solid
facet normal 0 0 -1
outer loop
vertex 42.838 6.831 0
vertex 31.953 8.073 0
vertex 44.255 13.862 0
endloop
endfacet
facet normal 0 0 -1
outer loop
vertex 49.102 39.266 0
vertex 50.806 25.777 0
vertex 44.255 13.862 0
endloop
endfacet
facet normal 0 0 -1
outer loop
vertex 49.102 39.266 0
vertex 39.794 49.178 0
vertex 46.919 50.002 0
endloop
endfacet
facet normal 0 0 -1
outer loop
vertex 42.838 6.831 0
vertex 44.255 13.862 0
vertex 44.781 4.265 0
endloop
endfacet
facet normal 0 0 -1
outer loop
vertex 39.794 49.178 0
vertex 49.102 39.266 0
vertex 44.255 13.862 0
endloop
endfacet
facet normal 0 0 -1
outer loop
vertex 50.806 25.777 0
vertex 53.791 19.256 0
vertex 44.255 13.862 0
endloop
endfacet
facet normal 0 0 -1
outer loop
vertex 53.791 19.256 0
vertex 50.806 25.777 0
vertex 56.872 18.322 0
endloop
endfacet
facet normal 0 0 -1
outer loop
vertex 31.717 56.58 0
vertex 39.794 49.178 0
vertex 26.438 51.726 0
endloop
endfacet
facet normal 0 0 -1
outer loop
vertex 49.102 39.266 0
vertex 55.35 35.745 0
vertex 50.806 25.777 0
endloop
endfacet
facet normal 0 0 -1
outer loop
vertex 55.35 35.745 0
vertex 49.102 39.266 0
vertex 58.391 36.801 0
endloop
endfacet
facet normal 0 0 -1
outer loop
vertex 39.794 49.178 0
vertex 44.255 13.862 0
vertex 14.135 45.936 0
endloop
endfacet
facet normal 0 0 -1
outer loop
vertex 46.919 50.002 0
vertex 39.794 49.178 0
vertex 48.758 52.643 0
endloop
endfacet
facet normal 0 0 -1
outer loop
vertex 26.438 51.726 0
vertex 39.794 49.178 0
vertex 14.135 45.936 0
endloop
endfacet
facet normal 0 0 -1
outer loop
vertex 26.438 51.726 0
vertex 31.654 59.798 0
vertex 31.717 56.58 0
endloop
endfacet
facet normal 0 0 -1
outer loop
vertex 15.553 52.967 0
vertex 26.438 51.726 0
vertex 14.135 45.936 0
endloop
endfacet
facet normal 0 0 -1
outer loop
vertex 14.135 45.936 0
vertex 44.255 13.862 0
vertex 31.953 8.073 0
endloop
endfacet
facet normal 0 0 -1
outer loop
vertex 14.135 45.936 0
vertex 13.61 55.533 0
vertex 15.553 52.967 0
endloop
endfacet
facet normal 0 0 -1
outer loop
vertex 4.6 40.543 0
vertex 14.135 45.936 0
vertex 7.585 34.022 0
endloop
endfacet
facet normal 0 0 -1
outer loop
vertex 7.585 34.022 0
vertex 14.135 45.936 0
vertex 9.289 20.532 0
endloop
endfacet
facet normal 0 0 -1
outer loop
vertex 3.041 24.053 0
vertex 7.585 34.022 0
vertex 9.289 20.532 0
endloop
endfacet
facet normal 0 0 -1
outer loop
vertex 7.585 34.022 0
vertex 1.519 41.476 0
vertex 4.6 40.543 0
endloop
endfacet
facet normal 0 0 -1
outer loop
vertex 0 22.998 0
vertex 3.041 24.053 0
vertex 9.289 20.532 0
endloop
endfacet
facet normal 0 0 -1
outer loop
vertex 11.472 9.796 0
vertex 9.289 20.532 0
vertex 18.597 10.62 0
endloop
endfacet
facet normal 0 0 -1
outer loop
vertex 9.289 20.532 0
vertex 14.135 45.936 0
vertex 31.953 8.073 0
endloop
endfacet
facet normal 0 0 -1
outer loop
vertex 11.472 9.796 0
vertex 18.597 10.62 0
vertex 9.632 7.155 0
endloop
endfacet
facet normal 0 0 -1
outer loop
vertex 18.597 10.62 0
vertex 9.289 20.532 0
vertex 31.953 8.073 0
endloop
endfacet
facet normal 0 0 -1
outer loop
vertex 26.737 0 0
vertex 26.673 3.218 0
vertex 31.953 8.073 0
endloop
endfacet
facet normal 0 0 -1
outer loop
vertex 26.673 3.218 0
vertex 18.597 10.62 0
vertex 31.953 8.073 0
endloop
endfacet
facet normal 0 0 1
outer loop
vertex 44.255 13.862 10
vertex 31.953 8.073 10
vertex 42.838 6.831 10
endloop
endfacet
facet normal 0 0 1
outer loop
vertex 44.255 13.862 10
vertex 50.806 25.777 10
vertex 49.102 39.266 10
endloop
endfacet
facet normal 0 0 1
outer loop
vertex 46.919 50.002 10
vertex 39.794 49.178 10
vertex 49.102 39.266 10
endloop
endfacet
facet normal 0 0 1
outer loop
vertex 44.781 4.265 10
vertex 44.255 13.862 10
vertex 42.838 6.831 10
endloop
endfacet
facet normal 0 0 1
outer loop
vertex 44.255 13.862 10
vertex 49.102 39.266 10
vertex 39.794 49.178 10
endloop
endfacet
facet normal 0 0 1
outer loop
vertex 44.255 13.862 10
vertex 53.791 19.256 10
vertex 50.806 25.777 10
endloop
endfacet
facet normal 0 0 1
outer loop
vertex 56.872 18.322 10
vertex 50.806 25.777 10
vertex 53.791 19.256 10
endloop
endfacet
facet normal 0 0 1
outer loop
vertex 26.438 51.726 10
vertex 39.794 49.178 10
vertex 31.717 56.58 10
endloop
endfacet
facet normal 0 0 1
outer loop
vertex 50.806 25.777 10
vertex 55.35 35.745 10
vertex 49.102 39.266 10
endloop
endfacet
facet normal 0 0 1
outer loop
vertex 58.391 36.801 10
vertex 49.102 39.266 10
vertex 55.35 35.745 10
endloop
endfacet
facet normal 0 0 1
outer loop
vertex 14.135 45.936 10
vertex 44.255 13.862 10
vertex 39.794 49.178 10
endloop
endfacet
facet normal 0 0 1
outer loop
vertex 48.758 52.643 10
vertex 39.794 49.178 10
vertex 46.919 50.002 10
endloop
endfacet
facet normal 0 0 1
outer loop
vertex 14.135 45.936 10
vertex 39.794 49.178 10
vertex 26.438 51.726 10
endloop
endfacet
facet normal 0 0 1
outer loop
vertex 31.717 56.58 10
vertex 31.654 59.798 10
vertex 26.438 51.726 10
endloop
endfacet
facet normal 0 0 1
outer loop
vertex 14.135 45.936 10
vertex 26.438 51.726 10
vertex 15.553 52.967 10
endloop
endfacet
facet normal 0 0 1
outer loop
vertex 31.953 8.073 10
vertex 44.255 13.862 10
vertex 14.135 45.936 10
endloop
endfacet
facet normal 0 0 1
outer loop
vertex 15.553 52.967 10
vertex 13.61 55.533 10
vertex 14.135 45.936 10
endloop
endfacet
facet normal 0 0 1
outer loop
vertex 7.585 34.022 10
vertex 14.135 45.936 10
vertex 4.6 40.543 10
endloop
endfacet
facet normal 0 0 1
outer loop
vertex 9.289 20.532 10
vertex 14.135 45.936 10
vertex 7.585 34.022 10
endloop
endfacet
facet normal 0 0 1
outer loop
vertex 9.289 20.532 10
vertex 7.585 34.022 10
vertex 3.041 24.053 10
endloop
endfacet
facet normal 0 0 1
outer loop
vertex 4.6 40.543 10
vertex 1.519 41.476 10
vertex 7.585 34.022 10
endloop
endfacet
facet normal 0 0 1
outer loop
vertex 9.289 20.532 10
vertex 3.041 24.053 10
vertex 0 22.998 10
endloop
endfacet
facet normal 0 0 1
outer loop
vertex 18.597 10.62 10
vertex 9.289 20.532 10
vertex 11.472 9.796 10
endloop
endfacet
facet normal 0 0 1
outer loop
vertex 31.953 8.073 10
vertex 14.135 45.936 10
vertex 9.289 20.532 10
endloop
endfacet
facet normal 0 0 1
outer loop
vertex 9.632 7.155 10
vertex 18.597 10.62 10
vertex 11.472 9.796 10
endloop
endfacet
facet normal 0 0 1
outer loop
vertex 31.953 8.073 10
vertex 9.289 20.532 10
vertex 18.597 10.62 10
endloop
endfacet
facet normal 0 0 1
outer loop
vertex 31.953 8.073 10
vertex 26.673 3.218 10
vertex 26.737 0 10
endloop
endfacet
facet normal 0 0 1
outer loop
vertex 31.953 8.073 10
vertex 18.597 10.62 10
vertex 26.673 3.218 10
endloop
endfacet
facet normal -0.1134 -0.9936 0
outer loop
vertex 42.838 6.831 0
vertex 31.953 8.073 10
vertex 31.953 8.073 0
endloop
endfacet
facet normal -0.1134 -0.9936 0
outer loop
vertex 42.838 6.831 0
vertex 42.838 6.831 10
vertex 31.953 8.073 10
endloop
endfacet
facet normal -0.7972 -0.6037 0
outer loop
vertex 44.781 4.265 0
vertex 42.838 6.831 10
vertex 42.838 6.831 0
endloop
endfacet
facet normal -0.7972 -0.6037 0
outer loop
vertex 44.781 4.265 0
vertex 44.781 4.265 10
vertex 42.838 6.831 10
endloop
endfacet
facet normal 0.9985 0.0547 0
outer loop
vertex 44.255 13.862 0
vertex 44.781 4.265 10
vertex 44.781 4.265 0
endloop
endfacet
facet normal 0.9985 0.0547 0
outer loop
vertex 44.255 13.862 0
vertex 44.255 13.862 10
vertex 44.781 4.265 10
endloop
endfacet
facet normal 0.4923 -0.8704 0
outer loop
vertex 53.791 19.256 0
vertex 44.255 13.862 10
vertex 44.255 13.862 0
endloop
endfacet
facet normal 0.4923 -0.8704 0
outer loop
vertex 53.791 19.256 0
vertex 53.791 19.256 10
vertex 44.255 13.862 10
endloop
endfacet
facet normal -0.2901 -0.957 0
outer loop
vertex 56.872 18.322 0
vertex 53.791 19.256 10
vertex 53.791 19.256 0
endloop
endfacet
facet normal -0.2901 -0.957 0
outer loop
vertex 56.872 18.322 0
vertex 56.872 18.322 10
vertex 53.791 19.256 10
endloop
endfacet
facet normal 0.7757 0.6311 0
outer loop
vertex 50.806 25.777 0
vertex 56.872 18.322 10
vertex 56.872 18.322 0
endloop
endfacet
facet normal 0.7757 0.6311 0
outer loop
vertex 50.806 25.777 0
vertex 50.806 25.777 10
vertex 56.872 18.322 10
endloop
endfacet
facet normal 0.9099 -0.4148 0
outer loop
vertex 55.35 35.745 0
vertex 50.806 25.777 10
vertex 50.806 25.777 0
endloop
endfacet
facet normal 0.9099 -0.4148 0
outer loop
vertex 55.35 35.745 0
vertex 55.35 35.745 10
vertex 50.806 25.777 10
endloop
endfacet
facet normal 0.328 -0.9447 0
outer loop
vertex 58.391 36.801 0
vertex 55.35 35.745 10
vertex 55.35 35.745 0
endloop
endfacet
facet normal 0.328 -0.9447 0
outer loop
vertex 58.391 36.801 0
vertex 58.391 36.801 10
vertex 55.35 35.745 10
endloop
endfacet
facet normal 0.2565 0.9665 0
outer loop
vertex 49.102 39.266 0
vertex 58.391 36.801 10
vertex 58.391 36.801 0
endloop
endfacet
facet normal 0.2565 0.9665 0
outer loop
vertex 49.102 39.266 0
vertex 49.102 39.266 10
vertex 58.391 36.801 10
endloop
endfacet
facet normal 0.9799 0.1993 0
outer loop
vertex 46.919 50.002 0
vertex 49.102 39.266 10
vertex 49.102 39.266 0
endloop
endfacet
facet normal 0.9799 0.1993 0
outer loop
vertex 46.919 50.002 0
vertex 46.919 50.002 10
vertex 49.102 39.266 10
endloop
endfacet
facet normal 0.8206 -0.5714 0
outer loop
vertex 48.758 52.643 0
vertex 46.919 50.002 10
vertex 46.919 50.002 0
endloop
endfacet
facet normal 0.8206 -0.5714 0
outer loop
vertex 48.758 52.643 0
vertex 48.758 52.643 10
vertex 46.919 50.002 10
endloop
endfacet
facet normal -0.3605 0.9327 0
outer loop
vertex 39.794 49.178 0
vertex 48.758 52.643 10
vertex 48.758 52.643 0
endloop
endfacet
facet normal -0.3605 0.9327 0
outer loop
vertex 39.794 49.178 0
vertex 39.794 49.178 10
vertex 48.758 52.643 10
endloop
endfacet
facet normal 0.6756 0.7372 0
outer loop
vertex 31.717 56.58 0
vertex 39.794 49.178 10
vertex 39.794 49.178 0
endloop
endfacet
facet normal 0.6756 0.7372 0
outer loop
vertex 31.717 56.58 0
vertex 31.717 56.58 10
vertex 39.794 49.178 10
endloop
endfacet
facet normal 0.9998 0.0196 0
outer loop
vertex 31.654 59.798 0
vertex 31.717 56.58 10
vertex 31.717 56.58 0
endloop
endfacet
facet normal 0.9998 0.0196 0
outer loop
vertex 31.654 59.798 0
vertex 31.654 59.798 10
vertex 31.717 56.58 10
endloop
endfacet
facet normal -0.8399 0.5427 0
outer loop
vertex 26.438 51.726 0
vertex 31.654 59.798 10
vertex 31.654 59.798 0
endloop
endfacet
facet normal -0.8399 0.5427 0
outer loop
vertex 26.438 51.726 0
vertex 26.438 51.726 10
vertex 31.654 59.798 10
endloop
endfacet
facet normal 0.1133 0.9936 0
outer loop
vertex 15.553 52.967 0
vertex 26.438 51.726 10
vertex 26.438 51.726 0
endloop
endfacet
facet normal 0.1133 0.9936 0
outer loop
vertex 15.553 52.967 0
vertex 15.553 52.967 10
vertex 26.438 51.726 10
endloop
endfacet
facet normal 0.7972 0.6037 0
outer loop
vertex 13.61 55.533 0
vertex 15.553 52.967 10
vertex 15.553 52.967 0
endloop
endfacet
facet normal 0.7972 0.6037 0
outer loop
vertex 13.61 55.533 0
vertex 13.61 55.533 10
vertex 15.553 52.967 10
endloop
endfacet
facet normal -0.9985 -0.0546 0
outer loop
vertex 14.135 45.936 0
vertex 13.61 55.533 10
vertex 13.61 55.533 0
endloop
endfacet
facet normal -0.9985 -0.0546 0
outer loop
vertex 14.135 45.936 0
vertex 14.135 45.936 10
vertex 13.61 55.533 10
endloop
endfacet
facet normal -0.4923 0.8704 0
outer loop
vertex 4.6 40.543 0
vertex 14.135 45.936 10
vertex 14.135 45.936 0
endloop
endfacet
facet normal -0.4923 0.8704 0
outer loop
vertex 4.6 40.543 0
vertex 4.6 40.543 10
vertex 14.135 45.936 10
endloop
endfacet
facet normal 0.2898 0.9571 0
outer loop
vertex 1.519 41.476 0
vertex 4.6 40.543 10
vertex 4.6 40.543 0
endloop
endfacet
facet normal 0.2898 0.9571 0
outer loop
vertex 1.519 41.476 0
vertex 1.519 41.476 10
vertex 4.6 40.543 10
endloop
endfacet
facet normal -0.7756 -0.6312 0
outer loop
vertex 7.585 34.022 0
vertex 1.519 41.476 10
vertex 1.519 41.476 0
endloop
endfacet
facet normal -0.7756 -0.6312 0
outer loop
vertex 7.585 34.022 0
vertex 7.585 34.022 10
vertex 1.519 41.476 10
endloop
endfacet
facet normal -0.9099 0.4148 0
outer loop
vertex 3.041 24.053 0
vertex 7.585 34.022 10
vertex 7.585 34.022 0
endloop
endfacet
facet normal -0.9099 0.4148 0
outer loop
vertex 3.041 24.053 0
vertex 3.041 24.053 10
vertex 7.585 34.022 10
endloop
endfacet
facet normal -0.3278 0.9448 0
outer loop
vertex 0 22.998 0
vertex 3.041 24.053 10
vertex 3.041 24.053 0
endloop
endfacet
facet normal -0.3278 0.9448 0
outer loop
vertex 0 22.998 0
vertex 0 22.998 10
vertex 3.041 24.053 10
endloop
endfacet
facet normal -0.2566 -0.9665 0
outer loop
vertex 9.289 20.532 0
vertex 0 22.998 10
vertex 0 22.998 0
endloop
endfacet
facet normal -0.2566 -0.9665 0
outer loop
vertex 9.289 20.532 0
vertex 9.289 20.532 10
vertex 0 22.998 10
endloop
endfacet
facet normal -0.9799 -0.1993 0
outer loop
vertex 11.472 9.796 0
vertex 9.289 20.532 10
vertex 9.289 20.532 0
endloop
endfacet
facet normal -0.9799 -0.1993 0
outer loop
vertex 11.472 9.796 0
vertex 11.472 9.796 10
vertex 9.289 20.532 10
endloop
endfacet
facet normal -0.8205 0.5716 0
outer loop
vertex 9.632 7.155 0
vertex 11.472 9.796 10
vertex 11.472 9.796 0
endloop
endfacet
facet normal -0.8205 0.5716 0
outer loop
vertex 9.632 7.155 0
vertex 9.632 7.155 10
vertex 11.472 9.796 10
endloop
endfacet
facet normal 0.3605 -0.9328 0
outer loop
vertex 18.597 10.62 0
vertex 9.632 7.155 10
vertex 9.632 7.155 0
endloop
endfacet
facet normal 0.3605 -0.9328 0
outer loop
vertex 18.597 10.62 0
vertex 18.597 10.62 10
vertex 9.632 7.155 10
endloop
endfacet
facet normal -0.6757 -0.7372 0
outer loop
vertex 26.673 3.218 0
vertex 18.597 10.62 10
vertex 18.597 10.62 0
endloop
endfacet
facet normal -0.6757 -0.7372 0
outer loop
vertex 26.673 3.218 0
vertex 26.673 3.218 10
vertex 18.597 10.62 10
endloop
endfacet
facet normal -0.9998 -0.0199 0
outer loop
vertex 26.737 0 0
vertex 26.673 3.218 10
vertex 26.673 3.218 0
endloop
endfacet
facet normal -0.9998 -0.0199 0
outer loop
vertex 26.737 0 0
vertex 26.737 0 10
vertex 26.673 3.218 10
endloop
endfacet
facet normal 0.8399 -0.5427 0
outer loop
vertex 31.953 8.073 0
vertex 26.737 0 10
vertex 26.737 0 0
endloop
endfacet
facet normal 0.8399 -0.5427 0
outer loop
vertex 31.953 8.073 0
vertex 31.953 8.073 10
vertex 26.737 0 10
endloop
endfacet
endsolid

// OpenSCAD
$fn = 32;

// ----------------------------------------------------------------------
// Fan rotor section: 10 blades, 22 mm hub radius, 8 mm blades
// ----------------------------------------------------------------------

// --- parameters (mm) ---
profile_height = 10;      // extrusion height
profile_points = 30;      // points of the closed outline

profile = [[50.806, 25.777], [55.35, 35.745], [58.391, 36.801], [49.102, 39.266], [46.919, 50.002], [48.758, 52.643], [39.794, 49.178], [31.717, 56.58], [31.654, 59.798], [26.438, 51.726], [15.553, 52.967], [13.61, 55.533], [14.135, 45.936], [4.6, 40.543], [1.519, 41.476], [7.585, 34.022], [3.041, 24.053], [0, 22.998], [9.289, 20.532], [11.472, 9.796], [9.632, 7.155], [18.597, 10.62], [26.673, 3.218], [26.737, 0], [31.953, 8.073], [42.838, 6.831], [44.781, 4.265], [44.255, 13.862], [53.791, 19.256], [56.872, 18.322]];  // single closed polygon, 30 points, counter clockwise

// --- the one profile operation ---
linear_extrude(height = profile_height) polygon(points = profile);
